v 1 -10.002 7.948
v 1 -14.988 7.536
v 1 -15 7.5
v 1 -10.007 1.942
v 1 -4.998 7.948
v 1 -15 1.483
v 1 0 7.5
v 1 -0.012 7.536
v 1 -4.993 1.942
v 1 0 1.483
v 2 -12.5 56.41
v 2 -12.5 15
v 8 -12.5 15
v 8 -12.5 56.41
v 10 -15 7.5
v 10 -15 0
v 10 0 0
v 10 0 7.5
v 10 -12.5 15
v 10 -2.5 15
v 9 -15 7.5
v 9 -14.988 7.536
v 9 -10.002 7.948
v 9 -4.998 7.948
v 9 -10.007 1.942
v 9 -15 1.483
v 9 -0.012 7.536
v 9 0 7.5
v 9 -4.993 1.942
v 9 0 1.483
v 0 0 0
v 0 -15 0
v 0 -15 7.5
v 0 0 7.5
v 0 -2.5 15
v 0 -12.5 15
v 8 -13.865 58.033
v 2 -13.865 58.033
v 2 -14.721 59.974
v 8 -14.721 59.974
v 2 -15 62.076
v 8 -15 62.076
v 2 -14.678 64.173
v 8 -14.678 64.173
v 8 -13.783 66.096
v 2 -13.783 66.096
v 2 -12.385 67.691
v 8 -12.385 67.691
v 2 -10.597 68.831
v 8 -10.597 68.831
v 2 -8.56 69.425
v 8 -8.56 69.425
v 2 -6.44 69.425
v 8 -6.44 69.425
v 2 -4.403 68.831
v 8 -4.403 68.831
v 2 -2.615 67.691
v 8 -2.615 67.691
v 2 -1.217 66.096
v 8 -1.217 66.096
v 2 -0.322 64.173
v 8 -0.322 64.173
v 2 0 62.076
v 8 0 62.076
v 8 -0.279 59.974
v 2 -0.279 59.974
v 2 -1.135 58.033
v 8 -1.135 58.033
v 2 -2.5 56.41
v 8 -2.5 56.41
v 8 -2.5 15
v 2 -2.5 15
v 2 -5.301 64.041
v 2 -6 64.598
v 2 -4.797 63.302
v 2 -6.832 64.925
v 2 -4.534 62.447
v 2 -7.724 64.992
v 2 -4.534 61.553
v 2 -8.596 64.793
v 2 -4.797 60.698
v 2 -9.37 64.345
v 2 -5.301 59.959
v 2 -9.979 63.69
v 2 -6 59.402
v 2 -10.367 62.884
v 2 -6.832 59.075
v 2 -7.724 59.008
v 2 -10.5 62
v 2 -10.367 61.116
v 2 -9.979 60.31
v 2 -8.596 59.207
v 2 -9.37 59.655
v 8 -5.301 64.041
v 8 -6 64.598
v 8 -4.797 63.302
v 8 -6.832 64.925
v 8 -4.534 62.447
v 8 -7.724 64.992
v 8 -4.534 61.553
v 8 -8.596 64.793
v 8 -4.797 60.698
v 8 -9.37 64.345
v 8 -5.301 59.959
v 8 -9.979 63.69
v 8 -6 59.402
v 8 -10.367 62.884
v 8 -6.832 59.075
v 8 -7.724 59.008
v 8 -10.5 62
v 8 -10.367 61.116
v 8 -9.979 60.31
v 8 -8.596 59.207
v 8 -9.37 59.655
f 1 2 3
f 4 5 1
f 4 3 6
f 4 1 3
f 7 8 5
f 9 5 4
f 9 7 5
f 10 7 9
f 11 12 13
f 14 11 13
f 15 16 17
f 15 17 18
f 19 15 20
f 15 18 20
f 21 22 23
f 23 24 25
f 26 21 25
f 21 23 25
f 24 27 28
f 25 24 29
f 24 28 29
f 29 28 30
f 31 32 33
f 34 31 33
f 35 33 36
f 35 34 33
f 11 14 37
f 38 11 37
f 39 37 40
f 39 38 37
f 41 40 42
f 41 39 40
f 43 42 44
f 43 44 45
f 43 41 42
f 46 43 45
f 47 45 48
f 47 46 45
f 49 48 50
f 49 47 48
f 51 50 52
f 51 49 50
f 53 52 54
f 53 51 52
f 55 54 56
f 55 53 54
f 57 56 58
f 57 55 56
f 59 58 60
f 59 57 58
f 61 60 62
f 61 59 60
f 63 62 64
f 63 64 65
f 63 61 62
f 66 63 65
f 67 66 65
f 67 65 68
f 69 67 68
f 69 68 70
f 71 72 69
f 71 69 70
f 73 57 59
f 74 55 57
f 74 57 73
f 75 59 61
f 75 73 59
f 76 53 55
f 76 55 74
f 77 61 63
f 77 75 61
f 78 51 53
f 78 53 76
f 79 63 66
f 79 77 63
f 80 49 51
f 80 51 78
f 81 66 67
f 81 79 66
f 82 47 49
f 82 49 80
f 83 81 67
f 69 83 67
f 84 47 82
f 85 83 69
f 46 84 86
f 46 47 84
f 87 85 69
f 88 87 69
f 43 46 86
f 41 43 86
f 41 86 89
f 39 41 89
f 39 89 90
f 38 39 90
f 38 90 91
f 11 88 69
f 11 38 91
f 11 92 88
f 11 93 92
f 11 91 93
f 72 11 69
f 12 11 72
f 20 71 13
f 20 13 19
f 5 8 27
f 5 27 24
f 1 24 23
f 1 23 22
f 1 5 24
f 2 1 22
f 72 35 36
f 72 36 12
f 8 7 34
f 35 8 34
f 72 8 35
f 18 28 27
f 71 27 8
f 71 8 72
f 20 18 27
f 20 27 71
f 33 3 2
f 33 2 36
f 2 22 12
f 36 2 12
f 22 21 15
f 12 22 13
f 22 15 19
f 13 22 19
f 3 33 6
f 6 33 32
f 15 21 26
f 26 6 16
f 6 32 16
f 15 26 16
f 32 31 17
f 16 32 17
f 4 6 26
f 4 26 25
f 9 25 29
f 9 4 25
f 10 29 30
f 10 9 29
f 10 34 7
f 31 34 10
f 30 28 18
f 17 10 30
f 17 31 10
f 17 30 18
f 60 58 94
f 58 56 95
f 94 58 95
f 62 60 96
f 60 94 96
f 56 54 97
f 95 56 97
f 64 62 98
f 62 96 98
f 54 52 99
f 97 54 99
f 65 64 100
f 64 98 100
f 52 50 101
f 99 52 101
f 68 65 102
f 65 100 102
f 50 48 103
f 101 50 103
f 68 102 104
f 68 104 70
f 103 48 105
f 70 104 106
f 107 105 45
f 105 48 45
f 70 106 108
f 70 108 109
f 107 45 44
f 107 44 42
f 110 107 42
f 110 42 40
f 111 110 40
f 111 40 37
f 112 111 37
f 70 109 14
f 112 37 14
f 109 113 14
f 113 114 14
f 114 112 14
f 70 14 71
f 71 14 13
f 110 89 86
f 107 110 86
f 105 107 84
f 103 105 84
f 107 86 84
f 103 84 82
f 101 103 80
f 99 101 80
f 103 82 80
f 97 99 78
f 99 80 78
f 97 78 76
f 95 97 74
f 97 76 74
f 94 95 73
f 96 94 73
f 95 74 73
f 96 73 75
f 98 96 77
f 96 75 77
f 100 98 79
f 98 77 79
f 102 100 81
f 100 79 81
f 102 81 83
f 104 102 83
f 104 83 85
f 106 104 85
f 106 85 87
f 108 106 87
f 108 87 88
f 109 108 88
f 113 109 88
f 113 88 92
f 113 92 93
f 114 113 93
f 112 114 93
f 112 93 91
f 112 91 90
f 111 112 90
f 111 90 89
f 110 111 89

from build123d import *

# Parameters (mm, degrees)
SKETCH1_W               = 10
SKETCH1_H               = 15
BOSS_EXTRUDE1_DEPTH     = 15
CUT_EXTRUDE1_DEPTH      = 30
CUT_EXTRUDE3_DEPTH      = 4
CUT_EXTRUDE3_DEPTH_BACK = 4
CUT_EXTRUDE3_START      = -5
SKETCH13_W              = 10
SKETCH13_H              = 10
BOSS_EXTRUDE2_DEPTH     = 52
SKETCH14_R              = 7.5
SKETCH14_R_2            = 5
BOSS_EXTRUDE3_DEPTH     = 10
SKETCH16_R              = 3
CUT_EXTRUDE4_DEPTH      = 10
CUT_EXTRUDE5_DEPTH      = 10
CUT_EXTRUDE5_DEPTH_BACK = 20
SKETCH17_W              = 2
SKETCH17_H              = 56.751381774
SKETCH17_H_2            = 60.928957135


with BuildPart() as part:
    # Sketch1 → Boss-Extrude1 (new body)
    with BuildSketch(Plane.XY):
        with Locations((5, -7.5)):
            Rectangle(SKETCH1_W, SKETCH1_H)
    extrude(amount=BOSS_EXTRUDE1_DEPTH)

    # Sketch2 → Cut-Extrude1 (cut)
    with BuildSketch(Plane(origin=(10, 0, 0), x_dir=(0, 0, -1), z_dir=(1, 0, 0))):
        Polygon((-7.5, 0), (-15, -2.5), (-15, 0), align=None)
        Polygon((-7.5, -15), (-15, -12.5), (-15, -15), align=None)
    extrude(amount=-CUT_EXTRUDE1_DEPTH, mode=Mode.SUBTRACT)

    # Sketch12 → Cut-Extrude3 (cut, two sides: drawn at the far end of the back side and taken through both)
    with BuildSketch(Plane(origin=(10, 0, 0), x_dir=(0, 0, -1), z_dir=(1, 0, 0)).offset(CUT_EXTRUDE3_START - CUT_EXTRUDE3_DEPTH_BACK)):
        with BuildLine():
            ThreePointArc((7.921073494, 33.458565328), (-8, -7.5), (7.921073494, -48.458565328))
            ThreePointArc((7.921073494, -48.458565328), (12.159622245, -48.644856749), (12.345913666, -44.406307999))
            ThreePointArc((12.345913666, -44.406307999), (-2, -7.5), (12.345913666, 29.406307999))
            ThreePointArc((12.345913666, 29.406307999), (12.159622245, 33.644856749), (7.921073494, 33.458565328))
        make_face()
    extrude(amount=CUT_EXTRUDE3_DEPTH + CUT_EXTRUDE3_DEPTH_BACK, mode=Mode.SUBTRACT)

    # Sketch13 → Boss-Extrude2 (add)
    with BuildSketch(Plane.XY.offset(15)):
        with Locations((5, -7.5)):
            Rectangle(SKETCH13_W, SKETCH13_H)
    extrude(amount=BOSS_EXTRUDE2_DEPTH)

    # Sketch14 → Boss-Extrude3 (add)
    with BuildSketch(Plane.ZY):
        with Locations((62, -7.5)):
            Circle(SKETCH14_R)
        with Locations((62, -7.5)):
            Circle(SKETCH14_R_2, mode=Mode.SUBTRACT)
    extrude(amount=-BOSS_EXTRUDE3_DEPTH)

    # Sketch16 → Cut-Extrude4 (cut)
    with BuildSketch(Plane.ZY):
        with Locations(Location((62, -7.5, 0), (0, 0, 270))):
            Circle(SKETCH16_R)
    extrude(amount=-CUT_EXTRUDE4_DEPTH, mode=Mode.SUBTRACT)

    # Sketch17 → Cut-Extrude5 (cut, two sides: drawn at the far end of the back side and taken through both)
    with BuildSketch(Plane(origin=(0, -2.5, 0), x_dir=(1, 0, 0), z_dir=(0, 1, 0)).offset(-CUT_EXTRUDE5_DEPTH_BACK)):
        with Locations((1, -43.375690887)):
            Rectangle(SKETCH17_W, SKETCH17_H)
        with Locations((9, -45.464478568)):
            Rectangle(SKETCH17_W, SKETCH17_H_2)
    extrude(amount=CUT_EXTRUDE5_DEPTH + CUT_EXTRUDE5_DEPTH_BACK, mode=Mode.SUBTRACT)


solid = part.part
